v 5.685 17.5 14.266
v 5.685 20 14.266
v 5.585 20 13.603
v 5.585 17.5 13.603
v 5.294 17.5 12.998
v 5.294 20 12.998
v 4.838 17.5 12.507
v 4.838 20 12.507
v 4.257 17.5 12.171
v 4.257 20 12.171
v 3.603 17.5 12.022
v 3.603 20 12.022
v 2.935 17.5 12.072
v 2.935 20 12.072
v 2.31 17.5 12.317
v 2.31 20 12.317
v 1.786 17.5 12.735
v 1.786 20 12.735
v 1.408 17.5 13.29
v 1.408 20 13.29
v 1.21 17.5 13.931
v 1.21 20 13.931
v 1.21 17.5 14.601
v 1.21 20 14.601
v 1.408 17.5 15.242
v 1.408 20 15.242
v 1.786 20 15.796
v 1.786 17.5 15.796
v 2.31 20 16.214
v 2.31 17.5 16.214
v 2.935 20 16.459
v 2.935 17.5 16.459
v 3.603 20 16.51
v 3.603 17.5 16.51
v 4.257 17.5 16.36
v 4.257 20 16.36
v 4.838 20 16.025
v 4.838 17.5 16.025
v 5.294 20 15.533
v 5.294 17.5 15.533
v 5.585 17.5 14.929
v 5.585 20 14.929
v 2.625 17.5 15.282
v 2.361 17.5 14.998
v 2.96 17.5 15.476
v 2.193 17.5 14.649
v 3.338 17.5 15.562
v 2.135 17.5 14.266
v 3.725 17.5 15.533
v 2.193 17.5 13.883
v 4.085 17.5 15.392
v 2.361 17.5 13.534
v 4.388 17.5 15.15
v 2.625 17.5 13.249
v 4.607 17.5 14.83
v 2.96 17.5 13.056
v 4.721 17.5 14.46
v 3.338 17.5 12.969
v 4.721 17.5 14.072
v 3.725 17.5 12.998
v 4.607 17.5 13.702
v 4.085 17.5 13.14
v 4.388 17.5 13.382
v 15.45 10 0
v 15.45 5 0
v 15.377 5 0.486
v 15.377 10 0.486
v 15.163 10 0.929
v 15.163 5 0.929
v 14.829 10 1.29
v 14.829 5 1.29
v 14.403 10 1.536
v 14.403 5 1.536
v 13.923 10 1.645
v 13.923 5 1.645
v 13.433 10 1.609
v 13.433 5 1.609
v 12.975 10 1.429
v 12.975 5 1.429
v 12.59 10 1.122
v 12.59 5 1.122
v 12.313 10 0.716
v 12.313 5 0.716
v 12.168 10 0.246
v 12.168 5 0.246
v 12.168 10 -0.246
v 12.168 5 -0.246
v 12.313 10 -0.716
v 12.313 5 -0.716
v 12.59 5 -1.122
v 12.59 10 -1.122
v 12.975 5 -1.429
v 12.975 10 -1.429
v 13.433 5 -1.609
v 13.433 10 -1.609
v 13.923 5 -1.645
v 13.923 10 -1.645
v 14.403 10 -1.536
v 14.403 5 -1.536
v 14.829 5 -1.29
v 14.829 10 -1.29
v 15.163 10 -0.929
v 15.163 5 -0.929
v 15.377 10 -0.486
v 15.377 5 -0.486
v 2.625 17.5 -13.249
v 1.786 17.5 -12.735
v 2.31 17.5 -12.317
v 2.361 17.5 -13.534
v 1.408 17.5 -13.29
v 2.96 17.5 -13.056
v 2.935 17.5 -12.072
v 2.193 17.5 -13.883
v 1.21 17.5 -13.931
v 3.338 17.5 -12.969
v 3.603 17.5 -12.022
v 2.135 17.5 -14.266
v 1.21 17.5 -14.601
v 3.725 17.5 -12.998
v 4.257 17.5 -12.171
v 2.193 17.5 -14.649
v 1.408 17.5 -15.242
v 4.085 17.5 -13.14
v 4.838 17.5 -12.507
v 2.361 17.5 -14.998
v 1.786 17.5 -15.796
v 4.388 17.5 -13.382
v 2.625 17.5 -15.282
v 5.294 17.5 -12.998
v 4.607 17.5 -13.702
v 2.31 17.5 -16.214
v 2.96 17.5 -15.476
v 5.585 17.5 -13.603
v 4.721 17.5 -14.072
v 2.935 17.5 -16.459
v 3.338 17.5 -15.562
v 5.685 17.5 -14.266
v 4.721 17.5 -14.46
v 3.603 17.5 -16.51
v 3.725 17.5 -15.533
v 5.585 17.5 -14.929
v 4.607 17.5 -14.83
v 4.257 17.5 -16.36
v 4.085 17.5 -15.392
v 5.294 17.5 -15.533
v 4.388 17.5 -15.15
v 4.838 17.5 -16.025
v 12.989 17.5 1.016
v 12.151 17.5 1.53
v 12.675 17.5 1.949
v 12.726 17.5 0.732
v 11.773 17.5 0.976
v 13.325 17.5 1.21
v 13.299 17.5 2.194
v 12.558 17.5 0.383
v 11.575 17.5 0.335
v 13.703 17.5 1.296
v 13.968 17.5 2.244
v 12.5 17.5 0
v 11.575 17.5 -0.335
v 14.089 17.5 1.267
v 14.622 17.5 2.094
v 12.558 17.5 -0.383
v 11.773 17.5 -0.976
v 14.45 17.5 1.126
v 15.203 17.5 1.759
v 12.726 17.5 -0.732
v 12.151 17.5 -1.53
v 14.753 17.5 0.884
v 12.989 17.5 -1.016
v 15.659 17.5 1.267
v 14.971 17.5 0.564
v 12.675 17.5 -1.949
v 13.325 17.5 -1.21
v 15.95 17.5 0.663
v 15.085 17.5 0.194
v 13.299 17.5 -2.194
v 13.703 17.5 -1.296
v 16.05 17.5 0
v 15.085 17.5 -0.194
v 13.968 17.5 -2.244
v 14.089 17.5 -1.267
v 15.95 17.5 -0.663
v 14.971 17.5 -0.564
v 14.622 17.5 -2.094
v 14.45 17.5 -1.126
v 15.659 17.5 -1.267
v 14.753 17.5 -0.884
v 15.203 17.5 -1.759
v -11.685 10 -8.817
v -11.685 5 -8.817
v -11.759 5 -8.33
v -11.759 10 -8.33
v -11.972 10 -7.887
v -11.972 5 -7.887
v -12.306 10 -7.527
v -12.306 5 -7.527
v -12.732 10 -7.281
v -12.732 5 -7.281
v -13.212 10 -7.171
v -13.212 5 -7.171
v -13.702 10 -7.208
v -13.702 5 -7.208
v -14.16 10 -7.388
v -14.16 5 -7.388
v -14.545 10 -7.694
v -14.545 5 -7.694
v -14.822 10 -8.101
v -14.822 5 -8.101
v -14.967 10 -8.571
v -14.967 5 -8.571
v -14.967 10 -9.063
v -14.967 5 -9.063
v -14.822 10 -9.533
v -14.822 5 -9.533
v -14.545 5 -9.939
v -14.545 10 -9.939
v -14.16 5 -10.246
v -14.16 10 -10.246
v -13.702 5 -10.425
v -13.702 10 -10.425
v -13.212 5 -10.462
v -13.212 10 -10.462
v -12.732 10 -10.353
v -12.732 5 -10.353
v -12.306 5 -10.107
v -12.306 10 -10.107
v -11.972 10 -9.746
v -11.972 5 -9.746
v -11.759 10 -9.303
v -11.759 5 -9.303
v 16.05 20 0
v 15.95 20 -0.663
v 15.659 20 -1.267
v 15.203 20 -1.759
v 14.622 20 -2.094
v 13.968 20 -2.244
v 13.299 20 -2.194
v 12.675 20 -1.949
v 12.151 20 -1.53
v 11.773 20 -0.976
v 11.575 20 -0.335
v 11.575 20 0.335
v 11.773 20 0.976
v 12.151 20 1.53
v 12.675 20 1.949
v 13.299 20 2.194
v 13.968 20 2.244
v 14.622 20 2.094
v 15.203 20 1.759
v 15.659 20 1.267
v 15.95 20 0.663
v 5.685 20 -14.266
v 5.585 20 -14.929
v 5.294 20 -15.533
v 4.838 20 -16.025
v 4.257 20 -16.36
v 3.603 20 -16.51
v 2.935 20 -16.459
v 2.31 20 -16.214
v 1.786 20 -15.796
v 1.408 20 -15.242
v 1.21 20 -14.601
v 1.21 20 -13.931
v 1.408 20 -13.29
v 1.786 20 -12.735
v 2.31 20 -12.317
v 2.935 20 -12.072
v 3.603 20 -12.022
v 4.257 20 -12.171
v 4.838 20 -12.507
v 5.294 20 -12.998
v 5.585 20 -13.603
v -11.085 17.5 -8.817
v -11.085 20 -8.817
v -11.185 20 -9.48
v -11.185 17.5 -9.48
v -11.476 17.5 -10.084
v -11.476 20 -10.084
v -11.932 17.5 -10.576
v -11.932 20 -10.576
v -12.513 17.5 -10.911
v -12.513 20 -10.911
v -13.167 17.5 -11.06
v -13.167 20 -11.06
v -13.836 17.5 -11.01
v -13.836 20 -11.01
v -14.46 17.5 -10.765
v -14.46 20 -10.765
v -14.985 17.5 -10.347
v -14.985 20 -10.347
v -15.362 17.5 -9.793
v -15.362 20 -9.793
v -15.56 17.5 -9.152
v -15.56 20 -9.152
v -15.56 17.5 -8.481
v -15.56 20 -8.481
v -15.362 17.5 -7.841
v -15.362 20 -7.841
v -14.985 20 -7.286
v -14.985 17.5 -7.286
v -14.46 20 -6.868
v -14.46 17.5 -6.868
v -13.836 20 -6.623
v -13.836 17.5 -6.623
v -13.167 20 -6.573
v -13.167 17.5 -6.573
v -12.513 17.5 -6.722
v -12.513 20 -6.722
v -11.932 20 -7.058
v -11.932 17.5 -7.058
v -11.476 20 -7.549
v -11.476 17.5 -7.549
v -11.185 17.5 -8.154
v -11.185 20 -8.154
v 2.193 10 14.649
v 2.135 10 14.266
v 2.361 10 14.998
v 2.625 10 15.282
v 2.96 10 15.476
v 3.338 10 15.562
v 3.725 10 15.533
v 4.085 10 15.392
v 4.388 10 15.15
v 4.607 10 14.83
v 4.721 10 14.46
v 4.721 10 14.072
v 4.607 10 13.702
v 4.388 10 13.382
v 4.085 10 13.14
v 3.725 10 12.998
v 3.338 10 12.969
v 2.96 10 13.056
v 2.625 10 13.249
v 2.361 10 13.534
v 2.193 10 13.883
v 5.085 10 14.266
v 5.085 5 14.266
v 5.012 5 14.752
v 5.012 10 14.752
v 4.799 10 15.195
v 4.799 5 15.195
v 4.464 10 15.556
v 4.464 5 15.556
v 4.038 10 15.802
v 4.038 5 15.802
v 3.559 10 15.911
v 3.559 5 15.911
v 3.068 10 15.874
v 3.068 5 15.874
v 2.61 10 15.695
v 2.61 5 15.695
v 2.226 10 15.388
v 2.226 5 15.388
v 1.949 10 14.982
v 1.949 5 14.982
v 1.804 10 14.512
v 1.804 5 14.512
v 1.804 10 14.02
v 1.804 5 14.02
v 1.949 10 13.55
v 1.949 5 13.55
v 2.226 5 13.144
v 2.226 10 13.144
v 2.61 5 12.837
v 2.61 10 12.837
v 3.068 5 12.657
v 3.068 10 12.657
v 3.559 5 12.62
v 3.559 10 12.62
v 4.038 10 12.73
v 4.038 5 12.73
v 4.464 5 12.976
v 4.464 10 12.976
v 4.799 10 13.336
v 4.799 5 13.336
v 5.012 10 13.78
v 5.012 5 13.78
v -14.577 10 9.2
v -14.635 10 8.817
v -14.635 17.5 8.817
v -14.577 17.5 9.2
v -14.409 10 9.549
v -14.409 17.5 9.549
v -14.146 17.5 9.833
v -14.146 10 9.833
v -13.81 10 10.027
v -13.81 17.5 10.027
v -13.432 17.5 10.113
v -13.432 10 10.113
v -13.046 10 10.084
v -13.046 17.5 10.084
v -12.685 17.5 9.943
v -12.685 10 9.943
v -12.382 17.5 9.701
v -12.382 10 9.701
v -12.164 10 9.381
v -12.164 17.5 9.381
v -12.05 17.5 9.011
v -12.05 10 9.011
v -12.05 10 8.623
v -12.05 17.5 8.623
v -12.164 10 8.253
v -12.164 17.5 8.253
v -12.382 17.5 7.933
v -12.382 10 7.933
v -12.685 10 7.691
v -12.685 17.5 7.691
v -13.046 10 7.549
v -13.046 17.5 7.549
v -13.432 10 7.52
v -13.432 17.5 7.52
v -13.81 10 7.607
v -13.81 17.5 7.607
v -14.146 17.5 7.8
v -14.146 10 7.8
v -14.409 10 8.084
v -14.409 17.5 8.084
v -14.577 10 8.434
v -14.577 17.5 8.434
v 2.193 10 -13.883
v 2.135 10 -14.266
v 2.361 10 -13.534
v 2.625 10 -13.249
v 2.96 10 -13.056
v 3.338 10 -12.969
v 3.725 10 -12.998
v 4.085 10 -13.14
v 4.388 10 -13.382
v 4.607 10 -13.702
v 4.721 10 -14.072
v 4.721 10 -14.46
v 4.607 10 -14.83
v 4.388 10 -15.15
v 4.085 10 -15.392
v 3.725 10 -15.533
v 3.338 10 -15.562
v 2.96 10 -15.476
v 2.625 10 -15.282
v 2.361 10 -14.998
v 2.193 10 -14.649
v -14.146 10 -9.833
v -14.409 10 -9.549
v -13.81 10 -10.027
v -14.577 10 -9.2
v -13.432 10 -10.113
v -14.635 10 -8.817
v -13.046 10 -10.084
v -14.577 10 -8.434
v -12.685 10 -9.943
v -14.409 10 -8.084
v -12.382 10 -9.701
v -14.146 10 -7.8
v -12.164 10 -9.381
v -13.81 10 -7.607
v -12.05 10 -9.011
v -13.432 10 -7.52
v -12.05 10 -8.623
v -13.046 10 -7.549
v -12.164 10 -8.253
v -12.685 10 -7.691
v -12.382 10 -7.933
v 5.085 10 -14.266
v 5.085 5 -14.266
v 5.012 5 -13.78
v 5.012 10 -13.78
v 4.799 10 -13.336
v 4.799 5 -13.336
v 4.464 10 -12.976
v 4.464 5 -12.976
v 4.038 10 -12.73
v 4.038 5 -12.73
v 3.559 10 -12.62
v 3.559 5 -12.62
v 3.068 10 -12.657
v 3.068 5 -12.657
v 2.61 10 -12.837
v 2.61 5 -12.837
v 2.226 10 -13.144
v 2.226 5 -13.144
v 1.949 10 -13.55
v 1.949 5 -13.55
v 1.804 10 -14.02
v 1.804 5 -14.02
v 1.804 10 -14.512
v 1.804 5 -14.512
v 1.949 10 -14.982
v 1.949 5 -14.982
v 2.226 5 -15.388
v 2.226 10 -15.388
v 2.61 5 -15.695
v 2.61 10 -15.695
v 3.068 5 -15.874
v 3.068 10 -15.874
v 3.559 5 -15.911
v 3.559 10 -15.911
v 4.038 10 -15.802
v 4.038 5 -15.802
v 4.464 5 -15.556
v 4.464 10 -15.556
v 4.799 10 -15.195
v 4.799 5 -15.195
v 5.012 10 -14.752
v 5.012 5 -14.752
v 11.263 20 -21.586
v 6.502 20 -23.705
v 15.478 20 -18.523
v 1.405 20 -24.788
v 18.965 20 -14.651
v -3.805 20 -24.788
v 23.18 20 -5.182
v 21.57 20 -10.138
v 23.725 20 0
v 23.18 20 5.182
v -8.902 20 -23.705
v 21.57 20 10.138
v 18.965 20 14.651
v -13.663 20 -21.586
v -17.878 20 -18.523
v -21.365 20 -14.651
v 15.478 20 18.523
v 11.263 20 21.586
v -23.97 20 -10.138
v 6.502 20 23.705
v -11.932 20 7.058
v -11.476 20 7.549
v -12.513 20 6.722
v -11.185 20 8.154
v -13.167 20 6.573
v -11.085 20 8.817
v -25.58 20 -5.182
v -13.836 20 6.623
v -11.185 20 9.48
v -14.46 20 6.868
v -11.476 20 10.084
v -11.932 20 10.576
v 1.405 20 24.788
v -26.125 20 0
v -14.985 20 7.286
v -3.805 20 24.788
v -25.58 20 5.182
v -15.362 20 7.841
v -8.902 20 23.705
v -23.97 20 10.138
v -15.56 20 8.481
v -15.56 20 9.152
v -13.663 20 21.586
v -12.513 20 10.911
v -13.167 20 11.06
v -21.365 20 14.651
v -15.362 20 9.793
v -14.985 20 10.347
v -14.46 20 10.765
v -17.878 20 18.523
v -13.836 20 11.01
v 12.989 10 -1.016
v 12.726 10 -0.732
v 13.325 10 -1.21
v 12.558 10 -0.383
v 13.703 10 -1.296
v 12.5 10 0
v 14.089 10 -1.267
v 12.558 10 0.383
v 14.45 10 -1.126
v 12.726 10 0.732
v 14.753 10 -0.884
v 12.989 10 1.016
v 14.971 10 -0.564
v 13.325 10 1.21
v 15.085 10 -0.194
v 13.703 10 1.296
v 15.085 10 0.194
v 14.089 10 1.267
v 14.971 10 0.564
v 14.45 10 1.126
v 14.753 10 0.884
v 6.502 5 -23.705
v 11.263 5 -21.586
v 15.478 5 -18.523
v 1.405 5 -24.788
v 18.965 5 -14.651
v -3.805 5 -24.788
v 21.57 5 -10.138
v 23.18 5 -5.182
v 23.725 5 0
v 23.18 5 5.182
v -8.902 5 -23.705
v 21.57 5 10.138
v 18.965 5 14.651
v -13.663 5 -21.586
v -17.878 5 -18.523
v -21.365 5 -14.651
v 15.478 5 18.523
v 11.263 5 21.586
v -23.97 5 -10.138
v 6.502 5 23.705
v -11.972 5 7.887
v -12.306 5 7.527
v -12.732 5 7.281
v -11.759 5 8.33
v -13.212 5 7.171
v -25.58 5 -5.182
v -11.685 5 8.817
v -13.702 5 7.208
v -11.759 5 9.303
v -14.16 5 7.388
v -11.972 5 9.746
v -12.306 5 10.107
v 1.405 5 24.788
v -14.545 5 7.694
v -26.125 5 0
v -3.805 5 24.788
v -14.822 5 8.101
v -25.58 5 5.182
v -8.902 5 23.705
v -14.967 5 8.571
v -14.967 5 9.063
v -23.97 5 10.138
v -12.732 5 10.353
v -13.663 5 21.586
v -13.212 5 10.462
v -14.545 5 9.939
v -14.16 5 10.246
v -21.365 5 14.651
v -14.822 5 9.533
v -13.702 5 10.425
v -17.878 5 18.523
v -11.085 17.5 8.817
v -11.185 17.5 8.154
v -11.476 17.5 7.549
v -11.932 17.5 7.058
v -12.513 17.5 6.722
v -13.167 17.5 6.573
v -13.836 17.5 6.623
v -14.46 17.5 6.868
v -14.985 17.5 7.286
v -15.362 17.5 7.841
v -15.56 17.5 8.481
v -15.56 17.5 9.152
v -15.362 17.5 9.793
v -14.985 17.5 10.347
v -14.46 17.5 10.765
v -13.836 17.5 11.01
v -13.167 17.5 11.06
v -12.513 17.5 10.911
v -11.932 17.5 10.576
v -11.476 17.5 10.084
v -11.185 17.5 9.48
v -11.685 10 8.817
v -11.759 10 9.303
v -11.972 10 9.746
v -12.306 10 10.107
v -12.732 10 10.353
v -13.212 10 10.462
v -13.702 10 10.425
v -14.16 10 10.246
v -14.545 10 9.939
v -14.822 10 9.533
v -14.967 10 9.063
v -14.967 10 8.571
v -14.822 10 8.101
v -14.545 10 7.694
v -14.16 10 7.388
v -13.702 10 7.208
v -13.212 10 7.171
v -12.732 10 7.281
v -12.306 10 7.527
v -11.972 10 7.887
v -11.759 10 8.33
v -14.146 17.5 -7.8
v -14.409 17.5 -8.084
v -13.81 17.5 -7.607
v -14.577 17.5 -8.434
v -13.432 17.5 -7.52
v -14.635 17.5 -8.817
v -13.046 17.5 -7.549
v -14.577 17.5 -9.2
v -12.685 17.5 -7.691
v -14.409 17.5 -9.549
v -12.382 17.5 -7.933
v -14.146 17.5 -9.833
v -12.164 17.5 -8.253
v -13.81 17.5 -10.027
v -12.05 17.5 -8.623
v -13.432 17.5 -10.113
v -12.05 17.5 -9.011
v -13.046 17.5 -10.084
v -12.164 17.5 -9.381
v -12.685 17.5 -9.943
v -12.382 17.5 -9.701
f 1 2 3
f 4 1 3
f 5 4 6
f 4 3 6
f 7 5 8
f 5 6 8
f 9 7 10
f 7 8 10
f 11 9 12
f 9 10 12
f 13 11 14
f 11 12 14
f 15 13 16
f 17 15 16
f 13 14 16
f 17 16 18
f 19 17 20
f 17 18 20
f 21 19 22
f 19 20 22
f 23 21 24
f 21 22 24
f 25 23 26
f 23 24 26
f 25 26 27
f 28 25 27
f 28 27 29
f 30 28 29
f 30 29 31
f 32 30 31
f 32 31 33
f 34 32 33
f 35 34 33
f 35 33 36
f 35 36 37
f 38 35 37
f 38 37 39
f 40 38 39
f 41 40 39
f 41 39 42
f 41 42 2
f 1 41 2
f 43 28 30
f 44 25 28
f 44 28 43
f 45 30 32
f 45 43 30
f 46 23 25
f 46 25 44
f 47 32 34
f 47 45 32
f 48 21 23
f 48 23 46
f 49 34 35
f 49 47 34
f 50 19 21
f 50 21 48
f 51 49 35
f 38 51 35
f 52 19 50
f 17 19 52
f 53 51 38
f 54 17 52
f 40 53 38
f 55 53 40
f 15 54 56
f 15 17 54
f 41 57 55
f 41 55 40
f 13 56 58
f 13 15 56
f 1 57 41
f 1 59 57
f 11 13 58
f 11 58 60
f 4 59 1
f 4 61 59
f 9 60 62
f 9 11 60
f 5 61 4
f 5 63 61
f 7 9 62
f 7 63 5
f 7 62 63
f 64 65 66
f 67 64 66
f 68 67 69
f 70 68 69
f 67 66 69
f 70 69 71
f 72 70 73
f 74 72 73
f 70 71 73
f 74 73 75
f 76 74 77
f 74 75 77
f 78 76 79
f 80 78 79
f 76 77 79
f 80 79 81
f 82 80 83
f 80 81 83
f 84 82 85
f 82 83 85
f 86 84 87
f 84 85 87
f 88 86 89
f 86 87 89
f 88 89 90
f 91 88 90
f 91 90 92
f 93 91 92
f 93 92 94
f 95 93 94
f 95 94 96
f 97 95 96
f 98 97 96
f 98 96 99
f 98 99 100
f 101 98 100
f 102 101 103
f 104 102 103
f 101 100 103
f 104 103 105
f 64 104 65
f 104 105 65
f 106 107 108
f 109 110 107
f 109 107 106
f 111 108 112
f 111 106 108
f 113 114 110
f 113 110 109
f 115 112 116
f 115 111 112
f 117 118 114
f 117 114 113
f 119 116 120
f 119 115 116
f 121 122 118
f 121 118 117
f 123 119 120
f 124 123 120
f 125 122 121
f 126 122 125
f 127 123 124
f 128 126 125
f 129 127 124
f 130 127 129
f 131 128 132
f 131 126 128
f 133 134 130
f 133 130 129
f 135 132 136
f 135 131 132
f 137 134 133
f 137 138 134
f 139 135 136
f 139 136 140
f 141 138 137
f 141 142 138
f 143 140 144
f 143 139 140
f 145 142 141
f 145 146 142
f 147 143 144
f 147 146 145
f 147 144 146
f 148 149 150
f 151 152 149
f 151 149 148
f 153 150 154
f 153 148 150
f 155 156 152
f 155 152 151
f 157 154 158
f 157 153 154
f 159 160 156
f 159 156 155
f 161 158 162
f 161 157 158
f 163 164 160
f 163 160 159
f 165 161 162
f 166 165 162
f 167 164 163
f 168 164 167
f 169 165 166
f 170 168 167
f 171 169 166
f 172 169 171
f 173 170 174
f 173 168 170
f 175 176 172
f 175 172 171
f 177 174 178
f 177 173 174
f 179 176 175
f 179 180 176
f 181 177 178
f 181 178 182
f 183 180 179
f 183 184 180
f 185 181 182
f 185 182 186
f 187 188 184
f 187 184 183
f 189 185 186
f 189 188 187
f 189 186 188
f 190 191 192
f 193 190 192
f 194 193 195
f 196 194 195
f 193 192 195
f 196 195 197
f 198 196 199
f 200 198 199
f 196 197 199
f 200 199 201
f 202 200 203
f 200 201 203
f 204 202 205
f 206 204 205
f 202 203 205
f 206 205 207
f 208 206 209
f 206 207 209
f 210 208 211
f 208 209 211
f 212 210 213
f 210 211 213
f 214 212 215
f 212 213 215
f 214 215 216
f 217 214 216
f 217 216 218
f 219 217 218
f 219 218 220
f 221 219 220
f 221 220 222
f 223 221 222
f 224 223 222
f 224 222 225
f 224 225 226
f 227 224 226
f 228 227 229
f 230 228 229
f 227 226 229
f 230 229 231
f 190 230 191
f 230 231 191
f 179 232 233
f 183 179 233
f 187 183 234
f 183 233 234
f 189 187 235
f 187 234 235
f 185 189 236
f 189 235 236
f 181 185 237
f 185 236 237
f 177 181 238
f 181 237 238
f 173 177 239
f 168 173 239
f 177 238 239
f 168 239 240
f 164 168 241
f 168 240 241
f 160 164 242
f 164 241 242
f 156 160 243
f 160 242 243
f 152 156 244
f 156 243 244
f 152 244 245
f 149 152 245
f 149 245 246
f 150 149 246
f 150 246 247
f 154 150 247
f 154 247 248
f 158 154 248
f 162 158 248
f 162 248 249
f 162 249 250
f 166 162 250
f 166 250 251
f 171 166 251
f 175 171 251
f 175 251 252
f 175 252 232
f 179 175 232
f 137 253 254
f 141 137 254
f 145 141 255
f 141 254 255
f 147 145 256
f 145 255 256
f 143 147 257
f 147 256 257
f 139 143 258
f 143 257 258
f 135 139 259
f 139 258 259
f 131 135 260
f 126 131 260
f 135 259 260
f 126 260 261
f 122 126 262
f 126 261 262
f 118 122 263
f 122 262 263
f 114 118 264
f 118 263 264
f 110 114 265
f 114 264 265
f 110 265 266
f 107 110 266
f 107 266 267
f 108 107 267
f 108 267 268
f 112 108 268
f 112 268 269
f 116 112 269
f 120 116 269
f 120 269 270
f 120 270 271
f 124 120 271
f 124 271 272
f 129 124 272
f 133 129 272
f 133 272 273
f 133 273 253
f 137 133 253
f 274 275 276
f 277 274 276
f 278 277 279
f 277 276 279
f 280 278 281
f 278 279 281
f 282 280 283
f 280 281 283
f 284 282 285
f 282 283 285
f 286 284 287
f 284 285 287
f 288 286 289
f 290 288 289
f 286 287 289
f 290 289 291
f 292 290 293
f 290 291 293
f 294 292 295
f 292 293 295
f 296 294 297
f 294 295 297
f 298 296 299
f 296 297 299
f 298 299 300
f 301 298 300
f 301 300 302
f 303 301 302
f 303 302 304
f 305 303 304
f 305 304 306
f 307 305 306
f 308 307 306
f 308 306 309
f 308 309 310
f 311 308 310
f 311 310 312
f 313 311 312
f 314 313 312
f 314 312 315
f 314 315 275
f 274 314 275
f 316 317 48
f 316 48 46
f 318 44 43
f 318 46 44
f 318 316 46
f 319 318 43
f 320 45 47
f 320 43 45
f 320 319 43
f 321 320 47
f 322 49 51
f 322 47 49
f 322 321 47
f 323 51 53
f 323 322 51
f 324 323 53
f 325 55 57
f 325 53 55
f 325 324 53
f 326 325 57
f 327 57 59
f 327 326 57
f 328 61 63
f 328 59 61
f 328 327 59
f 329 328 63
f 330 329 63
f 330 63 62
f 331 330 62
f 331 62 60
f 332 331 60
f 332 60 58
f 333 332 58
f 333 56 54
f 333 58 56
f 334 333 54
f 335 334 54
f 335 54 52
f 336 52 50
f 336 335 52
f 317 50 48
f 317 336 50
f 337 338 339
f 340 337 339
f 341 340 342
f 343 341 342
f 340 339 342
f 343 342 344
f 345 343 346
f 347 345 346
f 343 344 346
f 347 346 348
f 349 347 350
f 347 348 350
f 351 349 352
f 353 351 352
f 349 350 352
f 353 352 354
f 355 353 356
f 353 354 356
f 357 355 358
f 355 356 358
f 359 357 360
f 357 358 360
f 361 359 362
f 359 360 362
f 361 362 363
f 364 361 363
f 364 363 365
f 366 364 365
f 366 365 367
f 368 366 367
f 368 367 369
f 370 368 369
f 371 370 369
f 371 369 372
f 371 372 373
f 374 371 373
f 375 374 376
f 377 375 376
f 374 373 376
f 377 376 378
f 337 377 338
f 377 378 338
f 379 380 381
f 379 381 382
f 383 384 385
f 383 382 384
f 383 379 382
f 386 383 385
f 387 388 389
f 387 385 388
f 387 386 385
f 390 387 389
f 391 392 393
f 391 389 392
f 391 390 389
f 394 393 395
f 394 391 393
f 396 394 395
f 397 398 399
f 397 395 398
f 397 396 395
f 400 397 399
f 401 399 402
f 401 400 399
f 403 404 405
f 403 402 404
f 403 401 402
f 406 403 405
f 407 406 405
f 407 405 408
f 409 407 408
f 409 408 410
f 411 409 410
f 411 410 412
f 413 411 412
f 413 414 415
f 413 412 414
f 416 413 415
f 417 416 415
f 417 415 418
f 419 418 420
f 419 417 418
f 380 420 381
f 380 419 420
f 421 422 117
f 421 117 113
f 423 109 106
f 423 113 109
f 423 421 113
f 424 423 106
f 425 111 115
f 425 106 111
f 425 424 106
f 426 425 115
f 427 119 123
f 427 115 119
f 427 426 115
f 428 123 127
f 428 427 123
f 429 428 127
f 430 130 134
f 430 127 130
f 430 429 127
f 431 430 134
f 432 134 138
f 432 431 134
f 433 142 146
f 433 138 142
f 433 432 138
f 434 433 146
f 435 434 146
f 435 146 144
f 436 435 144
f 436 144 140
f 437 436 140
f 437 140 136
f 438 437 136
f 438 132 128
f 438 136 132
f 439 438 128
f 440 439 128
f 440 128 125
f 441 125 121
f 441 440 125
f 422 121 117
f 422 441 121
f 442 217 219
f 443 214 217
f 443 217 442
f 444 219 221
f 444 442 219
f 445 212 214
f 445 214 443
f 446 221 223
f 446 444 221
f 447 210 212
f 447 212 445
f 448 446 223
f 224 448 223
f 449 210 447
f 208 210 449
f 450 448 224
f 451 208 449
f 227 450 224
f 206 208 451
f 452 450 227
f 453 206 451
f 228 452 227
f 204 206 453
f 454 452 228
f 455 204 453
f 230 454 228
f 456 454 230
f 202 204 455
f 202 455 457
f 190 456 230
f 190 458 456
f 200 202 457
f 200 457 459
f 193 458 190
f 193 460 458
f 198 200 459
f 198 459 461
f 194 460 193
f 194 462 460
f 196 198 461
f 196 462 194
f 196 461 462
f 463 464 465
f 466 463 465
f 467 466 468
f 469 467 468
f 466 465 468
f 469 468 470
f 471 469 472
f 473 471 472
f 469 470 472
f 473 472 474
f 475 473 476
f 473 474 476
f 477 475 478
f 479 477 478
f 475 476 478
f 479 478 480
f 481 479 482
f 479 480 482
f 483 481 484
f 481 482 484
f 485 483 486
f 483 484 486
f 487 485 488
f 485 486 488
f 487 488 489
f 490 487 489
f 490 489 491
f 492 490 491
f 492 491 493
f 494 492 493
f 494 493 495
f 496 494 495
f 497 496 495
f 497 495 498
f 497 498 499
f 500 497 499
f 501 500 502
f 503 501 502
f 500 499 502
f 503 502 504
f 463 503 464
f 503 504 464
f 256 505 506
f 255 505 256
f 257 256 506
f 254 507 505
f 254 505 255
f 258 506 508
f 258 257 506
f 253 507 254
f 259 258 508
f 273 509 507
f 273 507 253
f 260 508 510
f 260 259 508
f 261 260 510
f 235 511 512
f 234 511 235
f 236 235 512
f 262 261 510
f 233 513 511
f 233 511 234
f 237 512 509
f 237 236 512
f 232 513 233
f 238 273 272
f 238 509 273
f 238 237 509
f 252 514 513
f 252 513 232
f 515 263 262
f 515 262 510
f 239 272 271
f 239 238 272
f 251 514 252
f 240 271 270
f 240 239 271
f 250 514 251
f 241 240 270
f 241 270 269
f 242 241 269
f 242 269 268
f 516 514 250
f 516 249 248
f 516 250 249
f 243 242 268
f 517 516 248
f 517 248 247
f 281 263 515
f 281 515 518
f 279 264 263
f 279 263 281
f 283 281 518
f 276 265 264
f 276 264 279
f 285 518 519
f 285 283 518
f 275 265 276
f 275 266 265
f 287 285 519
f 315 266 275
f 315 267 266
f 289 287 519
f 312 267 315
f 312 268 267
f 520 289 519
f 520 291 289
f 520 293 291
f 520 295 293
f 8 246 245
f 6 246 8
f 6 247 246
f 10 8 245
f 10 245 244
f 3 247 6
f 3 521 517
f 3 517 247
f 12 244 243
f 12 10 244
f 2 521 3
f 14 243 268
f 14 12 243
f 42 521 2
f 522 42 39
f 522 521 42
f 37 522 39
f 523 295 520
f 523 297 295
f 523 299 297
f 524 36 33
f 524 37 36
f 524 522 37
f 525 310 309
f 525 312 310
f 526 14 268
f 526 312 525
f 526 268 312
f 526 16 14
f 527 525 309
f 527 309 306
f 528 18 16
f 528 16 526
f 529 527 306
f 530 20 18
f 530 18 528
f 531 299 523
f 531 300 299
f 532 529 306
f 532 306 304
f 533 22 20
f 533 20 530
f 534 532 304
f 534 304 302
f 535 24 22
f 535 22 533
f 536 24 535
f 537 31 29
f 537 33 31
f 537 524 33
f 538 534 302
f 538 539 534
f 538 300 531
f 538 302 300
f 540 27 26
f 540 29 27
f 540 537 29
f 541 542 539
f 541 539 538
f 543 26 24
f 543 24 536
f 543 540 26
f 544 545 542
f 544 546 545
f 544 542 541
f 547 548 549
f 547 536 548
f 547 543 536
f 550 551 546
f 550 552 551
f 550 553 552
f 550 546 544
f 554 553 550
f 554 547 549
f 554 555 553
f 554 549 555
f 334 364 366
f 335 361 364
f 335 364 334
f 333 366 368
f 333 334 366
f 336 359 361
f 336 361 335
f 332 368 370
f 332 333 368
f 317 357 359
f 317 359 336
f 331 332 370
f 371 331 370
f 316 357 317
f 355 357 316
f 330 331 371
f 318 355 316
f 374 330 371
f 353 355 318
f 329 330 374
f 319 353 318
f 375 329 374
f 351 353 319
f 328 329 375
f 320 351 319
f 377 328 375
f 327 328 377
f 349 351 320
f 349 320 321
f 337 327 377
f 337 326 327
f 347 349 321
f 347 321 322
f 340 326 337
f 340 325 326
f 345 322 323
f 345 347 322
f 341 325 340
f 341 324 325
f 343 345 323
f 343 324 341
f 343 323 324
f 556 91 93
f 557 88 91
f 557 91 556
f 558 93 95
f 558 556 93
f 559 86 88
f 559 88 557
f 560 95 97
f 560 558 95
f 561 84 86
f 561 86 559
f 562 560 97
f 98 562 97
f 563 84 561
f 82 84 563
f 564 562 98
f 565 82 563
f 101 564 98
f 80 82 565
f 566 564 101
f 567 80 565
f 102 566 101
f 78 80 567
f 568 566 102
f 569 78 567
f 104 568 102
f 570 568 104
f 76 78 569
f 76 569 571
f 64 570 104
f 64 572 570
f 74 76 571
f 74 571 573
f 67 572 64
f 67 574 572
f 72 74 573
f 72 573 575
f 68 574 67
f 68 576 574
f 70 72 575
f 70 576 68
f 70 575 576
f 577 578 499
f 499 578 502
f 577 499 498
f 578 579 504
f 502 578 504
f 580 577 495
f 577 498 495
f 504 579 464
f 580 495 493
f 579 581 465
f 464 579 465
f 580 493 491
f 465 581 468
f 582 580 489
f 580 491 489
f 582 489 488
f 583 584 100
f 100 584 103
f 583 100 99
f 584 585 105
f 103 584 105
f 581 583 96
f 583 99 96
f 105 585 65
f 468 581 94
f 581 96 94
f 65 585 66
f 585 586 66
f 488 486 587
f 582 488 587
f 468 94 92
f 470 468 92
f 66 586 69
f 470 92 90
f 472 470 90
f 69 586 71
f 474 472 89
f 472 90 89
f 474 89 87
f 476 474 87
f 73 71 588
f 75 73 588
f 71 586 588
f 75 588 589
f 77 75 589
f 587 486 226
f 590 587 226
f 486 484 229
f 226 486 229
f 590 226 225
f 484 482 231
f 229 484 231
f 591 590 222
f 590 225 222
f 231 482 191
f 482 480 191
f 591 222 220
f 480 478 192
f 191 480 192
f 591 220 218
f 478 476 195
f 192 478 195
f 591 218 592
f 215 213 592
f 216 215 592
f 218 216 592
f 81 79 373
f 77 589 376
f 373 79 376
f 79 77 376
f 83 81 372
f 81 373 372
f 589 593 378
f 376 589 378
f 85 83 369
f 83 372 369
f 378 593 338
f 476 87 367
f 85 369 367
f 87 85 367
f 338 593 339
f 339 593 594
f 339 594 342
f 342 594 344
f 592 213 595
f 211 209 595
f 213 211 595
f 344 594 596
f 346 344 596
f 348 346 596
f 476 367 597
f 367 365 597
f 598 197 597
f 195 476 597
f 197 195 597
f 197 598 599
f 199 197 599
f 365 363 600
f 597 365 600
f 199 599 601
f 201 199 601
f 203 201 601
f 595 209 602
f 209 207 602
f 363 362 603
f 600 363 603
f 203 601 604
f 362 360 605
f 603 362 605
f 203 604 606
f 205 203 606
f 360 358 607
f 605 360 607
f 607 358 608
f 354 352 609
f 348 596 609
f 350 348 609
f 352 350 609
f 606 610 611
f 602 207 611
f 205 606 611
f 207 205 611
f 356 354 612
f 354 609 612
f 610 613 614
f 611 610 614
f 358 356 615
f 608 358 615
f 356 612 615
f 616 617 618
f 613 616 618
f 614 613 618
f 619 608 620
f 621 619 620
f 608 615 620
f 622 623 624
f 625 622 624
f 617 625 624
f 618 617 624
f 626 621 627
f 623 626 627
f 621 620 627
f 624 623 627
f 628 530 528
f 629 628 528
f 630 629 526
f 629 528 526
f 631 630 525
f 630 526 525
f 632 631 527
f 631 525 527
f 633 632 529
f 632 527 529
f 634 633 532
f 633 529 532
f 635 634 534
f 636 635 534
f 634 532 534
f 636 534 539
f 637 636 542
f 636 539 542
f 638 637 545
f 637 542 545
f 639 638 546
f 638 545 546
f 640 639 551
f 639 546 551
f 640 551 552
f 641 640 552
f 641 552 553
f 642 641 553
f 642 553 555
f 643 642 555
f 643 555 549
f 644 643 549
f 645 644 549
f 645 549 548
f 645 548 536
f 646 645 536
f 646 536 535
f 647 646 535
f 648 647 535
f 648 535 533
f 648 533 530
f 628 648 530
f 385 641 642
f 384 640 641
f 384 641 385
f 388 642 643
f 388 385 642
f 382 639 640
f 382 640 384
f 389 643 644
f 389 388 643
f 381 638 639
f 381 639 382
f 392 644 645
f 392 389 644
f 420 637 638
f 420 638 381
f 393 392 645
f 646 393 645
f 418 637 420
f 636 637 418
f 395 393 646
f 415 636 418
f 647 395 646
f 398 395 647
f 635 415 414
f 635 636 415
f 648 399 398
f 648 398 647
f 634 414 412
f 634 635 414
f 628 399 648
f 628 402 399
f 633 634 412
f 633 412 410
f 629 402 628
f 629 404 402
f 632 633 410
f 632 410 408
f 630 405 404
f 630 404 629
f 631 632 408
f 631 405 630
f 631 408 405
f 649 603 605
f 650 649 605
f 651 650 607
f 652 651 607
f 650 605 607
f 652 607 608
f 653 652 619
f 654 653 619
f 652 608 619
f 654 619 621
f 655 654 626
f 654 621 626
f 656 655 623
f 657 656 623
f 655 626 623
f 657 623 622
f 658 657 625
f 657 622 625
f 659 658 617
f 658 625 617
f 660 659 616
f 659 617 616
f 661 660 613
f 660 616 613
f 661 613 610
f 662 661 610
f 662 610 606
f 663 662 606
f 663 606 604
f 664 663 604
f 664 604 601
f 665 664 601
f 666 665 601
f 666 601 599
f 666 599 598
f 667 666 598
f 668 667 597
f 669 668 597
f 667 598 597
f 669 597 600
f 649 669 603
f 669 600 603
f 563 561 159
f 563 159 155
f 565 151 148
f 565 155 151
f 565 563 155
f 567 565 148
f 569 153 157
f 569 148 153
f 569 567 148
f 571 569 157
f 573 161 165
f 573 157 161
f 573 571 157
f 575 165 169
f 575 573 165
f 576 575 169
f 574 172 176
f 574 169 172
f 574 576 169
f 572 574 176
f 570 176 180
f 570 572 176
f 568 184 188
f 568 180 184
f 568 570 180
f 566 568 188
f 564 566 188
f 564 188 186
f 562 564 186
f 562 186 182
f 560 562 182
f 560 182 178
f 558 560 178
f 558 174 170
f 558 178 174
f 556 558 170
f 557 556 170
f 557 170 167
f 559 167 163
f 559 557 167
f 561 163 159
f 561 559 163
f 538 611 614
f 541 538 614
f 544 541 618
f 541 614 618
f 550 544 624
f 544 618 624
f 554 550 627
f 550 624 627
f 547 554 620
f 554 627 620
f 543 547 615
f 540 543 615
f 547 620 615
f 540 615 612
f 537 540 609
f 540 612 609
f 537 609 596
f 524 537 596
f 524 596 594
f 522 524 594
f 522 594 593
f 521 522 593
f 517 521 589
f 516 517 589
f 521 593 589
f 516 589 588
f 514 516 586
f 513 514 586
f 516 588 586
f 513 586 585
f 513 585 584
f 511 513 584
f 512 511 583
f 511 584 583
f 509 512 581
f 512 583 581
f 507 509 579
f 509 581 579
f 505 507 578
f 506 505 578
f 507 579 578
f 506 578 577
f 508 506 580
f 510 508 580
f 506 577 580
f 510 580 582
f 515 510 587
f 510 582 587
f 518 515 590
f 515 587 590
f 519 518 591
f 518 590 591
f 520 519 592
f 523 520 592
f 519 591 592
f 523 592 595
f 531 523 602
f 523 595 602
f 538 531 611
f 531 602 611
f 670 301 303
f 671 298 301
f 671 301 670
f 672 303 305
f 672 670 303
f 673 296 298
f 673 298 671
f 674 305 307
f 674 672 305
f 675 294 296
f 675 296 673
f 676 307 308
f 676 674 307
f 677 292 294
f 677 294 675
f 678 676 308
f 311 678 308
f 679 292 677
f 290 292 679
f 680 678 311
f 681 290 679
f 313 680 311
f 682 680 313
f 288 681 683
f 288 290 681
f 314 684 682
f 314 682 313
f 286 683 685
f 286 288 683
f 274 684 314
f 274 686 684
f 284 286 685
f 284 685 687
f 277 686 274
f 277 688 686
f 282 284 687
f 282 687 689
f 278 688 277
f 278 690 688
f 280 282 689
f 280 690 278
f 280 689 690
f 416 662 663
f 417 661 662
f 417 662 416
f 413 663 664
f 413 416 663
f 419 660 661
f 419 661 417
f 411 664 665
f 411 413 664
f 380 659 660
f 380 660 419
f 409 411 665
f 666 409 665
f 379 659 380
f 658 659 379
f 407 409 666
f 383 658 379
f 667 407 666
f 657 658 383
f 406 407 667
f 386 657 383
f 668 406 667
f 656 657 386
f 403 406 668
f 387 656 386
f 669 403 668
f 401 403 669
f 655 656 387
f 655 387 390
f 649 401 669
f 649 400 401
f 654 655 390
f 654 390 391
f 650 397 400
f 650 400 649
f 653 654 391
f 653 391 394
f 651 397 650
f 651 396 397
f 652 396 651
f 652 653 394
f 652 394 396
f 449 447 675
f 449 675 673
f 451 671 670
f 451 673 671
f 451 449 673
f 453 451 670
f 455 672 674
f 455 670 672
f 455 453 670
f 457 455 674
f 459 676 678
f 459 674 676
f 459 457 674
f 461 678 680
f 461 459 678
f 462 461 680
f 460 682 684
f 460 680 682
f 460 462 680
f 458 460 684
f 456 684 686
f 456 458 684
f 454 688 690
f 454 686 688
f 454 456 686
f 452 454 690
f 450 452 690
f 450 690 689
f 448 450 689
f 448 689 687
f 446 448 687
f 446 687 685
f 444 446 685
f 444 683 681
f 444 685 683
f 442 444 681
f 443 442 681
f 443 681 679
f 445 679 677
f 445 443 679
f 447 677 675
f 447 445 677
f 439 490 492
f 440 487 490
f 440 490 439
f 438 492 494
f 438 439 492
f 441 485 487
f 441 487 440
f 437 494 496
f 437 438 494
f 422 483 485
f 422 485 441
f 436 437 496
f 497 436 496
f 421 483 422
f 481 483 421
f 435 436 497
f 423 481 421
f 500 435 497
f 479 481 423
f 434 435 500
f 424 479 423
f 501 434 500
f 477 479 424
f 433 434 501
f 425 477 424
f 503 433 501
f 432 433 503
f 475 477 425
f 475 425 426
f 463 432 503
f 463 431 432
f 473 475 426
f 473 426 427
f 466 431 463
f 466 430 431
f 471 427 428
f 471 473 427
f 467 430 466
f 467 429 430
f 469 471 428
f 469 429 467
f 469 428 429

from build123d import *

# Parameters (mm, degrees)
BOSS_EXTRUDE1_DEPTH              = 5
BOSS_EXTRUDE1_DEPTH_BACK         = 10
SKETCH3_R                        = 24.925
SKETCH3_R_2                      = 1.3
SKETCH6_R                        = 1.65
CUT_EXTRUDE1_DEPTH               = 5
CBORE_FOR_M2_5_SHCS1_D           = 2.5
CBORE_FOR_M2_5_SHCS1_CBORE_D     = 4.5
CBORE_FOR_M2_5_SHCS1_CBORE_DEPTH = 2.5


with BuildPart() as part:
    # Sketch3 → Boss-Extrude1 (new, two sides: drawn at the far end of the back side and taken through both)
    with BuildSketch(Plane(origin=(0, 15, 0), x_dir=(1, 0, 0), z_dir=(0, 1, 0)).offset(-BOSS_EXTRUDE1_DEPTH_BACK)):
        with Locations(Location((-1.2, 0, 0), (0, 0, 180))):
            Circle(SKETCH3_R)
        with Locations(Location((13.8, 0, 0), (0, 0, 180))):
            Circle(SKETCH3_R_2, mode=Mode.SUBTRACT)
        with Locations(Location((3.435254916, -14.265847744, 0), (0, 0, 180))):
            Circle(SKETCH3_R_2, mode=Mode.SUBTRACT)
        with Locations(Location((-13.335254916, -8.816778784, 0), (0, 0, 180))):
            Circle(SKETCH3_R_2, mode=Mode.SUBTRACT)
        with Locations(Location((-13.335254916, 8.816778784, 0), (0, 0, 180))):
            Circle(SKETCH3_R_2, mode=Mode.SUBTRACT)
        with Locations(Location((3.435254916, 14.265847744, 0), (0, 0, 180))):
            Circle(SKETCH3_R_2, mode=Mode.SUBTRACT)
    extrude(amount=BOSS_EXTRUDE1_DEPTH + BOSS_EXTRUDE1_DEPTH_BACK)

    # Sketch6 → Cut-Extrude1 (cut)
    with BuildSketch(Plane.XZ.offset(-5)):
        with Locations((13.8, 0)):
            Circle(SKETCH6_R)
        with Locations((3.435254916, -14.265847744)):
            Circle(SKETCH6_R)
        with Locations((-13.335254915, -8.816778784)):
            Circle(SKETCH6_R)
        with Locations((-13.335254915, 8.816778784)):
            Circle(SKETCH6_R)
        with Locations((3.435254916, 14.265847744)):
            Circle(SKETCH6_R)
    extrude(amount=-CUT_EXTRUDE1_DEPTH, mode=Mode.SUBTRACT)

    # CBORE for M2.5 SHCS1 (through all)
    with Locations(Plane(origin=(0, 20, 0), x_dir=(1, 0, 0), z_dir=(0, 1, 0))):
        with Locations((13.8, 0), (3.435254916, -14.265847744), (-13.335254916, -8.816778784), (3.435254916, 14.265847744), (-13.335254916, 8.816778784)):
            CounterBoreHole(CBORE_FOR_M2_5_SHCS1_D / 2, CBORE_FOR_M2_5_SHCS1_CBORE_D / 2, CBORE_FOR_M2_5_SHCS1_CBORE_DEPTH)


solid = part.part
